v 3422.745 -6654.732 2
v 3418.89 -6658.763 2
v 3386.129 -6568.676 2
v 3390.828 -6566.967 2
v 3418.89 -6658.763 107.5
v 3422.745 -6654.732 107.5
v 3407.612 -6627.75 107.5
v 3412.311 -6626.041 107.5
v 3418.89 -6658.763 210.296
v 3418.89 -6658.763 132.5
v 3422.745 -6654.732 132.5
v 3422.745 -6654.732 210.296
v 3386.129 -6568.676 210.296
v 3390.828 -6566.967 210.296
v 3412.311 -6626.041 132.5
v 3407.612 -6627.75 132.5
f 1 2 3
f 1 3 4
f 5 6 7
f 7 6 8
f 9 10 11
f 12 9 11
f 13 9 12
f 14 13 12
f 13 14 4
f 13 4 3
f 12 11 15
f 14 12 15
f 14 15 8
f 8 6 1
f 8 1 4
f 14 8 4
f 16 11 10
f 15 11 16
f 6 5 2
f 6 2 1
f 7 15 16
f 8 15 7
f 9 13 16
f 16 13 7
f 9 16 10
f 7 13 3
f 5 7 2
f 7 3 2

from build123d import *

# Parameters (mm, degrees)
BOSS_EXTRUDE1_DEPTH = 208.295833
SKETCH3_W           = 25
SKETCH3_H           = 33
CUT_EXTRUDE1_DEPTH  = 36.788128275


with BuildPart() as part:
    # Sketch2 → Boss-Extrude1 (new body)
    with BuildSketch(Plane.XY.offset(2)):
        Polygon((3386.129332678, -6568.675675181), (3418.890080551, -6658.762542636), (3422.744518293, -6654.731505307), (3390.828268184, -6566.966872936), align=None)
    extrude(amount=BOSS_EXTRUDE1_DEPTH)

    # Sketch3 → Cut-Extrude1 (cut, through all)
    with BuildSketch(Plane(origin=(885.586873602, 322.050140106, 0), x_dir=(0, 0, -1), z_dir=(0.939787101, 0.341760449, 0))):
        with Locations((-120, -7409.760556288)):
            Rectangle(SKETCH3_W, SKETCH3_H)
    extrude(amount=-CUT_EXTRUDE1_DEPTH, mode=Mode.SUBTRACT)


solid = part.part
